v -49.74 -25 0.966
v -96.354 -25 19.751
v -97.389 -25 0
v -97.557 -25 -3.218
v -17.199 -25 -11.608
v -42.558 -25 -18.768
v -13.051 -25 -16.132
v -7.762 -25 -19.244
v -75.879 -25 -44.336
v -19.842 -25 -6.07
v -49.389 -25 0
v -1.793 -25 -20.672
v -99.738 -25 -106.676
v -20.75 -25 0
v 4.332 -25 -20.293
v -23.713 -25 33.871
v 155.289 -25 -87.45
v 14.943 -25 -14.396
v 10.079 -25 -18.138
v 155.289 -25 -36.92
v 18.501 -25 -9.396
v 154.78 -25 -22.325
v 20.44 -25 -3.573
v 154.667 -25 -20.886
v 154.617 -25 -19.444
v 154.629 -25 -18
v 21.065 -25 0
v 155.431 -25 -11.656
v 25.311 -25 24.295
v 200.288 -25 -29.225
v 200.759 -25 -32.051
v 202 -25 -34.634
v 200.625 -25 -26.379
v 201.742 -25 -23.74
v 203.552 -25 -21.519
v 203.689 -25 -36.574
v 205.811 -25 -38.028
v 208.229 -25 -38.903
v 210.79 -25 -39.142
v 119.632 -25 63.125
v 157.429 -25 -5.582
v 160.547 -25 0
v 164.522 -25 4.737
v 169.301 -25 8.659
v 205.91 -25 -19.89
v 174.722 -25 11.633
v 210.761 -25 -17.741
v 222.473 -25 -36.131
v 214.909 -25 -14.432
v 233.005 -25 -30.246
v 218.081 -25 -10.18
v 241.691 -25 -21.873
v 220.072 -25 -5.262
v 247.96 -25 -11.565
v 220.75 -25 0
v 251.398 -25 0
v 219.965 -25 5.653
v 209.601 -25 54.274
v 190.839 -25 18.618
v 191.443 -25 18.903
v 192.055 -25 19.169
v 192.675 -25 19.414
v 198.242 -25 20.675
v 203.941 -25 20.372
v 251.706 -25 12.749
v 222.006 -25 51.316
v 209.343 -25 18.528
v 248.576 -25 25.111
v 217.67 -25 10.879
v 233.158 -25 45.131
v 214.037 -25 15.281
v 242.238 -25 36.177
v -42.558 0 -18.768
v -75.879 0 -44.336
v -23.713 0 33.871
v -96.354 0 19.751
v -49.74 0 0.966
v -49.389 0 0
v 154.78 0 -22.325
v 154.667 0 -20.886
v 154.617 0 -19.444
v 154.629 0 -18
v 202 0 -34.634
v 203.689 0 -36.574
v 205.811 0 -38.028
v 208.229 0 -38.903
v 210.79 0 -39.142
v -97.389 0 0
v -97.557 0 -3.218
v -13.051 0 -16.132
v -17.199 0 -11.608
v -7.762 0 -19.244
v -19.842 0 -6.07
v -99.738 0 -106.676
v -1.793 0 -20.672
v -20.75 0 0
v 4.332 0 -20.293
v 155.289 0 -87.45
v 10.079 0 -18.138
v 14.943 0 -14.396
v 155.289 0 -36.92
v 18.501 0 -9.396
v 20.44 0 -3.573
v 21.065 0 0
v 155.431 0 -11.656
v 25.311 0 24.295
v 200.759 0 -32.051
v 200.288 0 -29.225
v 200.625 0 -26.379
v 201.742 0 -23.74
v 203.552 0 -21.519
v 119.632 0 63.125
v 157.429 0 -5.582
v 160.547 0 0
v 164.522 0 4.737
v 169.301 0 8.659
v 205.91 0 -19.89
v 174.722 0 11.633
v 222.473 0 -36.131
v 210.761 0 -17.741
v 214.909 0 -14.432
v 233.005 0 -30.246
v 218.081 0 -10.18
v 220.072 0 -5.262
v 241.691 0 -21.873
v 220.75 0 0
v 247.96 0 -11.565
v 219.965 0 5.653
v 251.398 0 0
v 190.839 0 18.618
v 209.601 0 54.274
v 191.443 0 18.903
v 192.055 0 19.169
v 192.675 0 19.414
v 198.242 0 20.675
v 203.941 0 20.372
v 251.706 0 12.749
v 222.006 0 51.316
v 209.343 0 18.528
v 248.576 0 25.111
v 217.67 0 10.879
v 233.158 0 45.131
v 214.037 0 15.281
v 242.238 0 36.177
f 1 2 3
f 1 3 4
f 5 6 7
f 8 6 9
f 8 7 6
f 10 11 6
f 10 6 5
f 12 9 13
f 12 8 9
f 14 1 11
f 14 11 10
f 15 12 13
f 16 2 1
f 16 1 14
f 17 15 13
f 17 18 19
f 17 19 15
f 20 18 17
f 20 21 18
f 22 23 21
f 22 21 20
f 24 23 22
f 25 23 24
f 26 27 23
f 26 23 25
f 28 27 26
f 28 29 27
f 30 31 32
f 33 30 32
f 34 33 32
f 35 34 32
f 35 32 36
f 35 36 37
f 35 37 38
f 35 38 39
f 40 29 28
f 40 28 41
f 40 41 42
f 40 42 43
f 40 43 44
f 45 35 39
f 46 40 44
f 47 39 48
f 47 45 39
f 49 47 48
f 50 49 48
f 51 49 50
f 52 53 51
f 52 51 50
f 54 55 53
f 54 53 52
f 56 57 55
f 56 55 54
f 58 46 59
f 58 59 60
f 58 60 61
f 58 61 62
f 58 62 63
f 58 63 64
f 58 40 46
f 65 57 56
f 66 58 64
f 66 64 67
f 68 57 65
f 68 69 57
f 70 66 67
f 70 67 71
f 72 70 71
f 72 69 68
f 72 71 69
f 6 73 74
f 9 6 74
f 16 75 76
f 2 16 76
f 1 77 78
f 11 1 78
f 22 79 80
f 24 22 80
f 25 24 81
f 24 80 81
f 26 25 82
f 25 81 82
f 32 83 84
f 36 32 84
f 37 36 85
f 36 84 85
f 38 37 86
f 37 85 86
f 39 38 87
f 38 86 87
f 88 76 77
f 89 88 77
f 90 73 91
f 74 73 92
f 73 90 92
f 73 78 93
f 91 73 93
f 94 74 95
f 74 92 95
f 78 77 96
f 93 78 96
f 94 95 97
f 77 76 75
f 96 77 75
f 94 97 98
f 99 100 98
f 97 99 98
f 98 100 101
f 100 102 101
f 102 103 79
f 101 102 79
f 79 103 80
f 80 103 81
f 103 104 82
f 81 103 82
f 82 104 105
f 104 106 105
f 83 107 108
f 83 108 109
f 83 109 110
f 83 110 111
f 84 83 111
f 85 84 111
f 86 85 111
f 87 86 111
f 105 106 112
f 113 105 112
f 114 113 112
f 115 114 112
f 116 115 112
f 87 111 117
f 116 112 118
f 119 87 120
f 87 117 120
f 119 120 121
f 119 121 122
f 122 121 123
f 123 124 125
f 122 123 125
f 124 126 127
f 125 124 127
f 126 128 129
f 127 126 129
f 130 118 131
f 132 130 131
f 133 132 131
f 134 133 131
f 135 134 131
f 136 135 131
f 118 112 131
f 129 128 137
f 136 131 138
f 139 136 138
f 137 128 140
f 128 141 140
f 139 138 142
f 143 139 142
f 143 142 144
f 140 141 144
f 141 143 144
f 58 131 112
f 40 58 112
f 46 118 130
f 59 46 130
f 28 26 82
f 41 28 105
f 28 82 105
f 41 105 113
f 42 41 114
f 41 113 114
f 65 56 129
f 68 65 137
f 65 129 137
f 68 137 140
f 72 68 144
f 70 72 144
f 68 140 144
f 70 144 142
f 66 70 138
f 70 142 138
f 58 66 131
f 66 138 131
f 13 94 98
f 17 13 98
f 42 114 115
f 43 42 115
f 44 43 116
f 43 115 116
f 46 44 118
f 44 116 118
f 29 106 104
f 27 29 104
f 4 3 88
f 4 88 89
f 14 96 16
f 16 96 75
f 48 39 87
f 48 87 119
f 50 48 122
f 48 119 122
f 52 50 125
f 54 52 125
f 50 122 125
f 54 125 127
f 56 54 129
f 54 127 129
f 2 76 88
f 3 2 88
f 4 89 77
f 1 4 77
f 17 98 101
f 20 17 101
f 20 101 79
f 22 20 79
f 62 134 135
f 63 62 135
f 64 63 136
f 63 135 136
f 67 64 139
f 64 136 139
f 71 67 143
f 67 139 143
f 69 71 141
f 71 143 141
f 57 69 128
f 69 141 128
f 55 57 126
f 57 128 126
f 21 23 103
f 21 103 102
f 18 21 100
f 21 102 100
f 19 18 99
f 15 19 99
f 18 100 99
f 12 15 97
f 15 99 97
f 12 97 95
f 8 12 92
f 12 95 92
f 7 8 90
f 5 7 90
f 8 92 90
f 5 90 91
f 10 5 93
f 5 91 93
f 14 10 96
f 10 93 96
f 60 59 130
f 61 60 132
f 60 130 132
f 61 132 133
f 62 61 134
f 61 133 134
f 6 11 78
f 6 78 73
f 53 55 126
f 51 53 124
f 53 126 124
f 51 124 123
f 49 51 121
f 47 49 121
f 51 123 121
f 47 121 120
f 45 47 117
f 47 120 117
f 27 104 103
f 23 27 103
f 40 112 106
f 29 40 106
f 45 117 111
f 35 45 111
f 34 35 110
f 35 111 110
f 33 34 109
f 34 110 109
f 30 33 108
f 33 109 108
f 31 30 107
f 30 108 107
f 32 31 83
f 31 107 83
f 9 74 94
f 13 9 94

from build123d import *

# Parameters (mm, degrees)
F1_DEPTH = 25


with BuildPart() as f1:
    # F0 (on Front) → F1 (new body)
    with BuildSketch(Plane.XZ):
        with BuildLine():
            ThreePointArc((210.7900996534, -39.1419847991), (237.6177301096, -26.3390851309), (251.3977370138, 0))
            Line((251.3977370138, 0), (220.75, 0))
            ThreePointArc((220.75, 0), (216.6313755102, -12.4080557961), (205.9104965167, -19.8904130406))
            ThreePointArc((205.9104965167, -19.8904130406), (203.7307412614, -21.3576975777), (202, -23.3347639831))
            Line((202, -23.3347639831), (202, -34.6340773268))
            ThreePointArc((202, -34.6340773268), (205.8105086824, -38.0278448107), (210.7900996534, -39.1419847991))
        make_face()
        with BuildLine():
            ThreePointArc((202, -23.3347639831), (200.2850186662, -28.984420655), (202, -34.6340773268))
            Line((202, -34.6340773268), (202, -23.3347639831))
        make_face()
        with BuildLine():
            Line((25.3114801989, 24.2953589364), (21.0646269025, 0))
            Line((21.0646269025, 0), (154, 0))
            Line((154, 0), (160.5472754862, 0))
            ThreePointArc((160.5472754862, 0), (166.8205732831, 6.8086025808), (174.7224661833, 11.6326489056))
            Line((174.7224661833, 11.6326489056), (190.8394987814, 18.6184778493))
            ThreePointArc((190.8394987814, 18.6184778493), (191.7478739862, 19.038511398), (192.6754452712, 19.4142575966))
            ThreePointArc((192.6754452712, 19.4142575966), (211.8020758636, 17.0667368091), (220.75, 0))
            Line((220.75, 0), (251.3977370138, 0))
            ThreePointArc((251.3977370138, 0), (242.2377138986, 36.1766919921), (209.6012580564, 54.2742282063))
            Line((209.6012580564, 54.2742282063), (119.6315883608, 63.1246931609))
            Line((119.6315883608, 63.1246931609), (25.3114801989, 24.2953589364))
        make_face()
        with BuildLine():
            ThreePointArc((20.4400724491, -3.5729453221), (-1.7931810673, -20.6723729083), (-20.75, 0))
            Line((-20.75, 0), (-49.3885839036, 0))
            Line((-49.3885839036, 0), (-42.5576653039, -18.7677946067))
            Line((-42.5576653039, -18.7677946067), (-75.8785055961, -44.3357746251))
            Line((-75.8785055961, -44.3357746251), (-99.7378202288, -106.6764599215))
            Line((-99.7378202288, -106.6764599215), (155.289266195, -87.449753308))
            Line((155.289266195, -87.449753308), (155.289266195, -36.919753308))
            Line((155.289266195, -36.919753308), (154.7796214415, -22.3254370622))
            ThreePointArc((154.7796214415, -22.3254370622), (154.6339324313, -20.1651687544), (154.6285738509, -18))
            ThreePointArc((154.6285738509, -18), (156.2841628525, -8.5713012671), (160.5472754862, 0))
            Line((160.5472754862, 0), (154, 0))
            Line((154, 0), (21.0646269025, 0))
            Line((21.0646269025, 0), (20.4400724491, -3.5729453221))
        make_face()
        Polygon((-49.3885839036, 0), (-20.75, 0), (-23.7132952534, 33.8706197351), (-96.3537068285, 19.7507540773), (-97.3887999889, 0), (-60.7786662376, 0), (-49.7400883137, 0.9657504298), align=None)
        Polygon((-97.5574338221, -3.2177252221), (-60.7786662376, 0), (-97.3887999889, 0), align=None)
    extrude(amount=F1_DEPTH)


solid = f1.part
